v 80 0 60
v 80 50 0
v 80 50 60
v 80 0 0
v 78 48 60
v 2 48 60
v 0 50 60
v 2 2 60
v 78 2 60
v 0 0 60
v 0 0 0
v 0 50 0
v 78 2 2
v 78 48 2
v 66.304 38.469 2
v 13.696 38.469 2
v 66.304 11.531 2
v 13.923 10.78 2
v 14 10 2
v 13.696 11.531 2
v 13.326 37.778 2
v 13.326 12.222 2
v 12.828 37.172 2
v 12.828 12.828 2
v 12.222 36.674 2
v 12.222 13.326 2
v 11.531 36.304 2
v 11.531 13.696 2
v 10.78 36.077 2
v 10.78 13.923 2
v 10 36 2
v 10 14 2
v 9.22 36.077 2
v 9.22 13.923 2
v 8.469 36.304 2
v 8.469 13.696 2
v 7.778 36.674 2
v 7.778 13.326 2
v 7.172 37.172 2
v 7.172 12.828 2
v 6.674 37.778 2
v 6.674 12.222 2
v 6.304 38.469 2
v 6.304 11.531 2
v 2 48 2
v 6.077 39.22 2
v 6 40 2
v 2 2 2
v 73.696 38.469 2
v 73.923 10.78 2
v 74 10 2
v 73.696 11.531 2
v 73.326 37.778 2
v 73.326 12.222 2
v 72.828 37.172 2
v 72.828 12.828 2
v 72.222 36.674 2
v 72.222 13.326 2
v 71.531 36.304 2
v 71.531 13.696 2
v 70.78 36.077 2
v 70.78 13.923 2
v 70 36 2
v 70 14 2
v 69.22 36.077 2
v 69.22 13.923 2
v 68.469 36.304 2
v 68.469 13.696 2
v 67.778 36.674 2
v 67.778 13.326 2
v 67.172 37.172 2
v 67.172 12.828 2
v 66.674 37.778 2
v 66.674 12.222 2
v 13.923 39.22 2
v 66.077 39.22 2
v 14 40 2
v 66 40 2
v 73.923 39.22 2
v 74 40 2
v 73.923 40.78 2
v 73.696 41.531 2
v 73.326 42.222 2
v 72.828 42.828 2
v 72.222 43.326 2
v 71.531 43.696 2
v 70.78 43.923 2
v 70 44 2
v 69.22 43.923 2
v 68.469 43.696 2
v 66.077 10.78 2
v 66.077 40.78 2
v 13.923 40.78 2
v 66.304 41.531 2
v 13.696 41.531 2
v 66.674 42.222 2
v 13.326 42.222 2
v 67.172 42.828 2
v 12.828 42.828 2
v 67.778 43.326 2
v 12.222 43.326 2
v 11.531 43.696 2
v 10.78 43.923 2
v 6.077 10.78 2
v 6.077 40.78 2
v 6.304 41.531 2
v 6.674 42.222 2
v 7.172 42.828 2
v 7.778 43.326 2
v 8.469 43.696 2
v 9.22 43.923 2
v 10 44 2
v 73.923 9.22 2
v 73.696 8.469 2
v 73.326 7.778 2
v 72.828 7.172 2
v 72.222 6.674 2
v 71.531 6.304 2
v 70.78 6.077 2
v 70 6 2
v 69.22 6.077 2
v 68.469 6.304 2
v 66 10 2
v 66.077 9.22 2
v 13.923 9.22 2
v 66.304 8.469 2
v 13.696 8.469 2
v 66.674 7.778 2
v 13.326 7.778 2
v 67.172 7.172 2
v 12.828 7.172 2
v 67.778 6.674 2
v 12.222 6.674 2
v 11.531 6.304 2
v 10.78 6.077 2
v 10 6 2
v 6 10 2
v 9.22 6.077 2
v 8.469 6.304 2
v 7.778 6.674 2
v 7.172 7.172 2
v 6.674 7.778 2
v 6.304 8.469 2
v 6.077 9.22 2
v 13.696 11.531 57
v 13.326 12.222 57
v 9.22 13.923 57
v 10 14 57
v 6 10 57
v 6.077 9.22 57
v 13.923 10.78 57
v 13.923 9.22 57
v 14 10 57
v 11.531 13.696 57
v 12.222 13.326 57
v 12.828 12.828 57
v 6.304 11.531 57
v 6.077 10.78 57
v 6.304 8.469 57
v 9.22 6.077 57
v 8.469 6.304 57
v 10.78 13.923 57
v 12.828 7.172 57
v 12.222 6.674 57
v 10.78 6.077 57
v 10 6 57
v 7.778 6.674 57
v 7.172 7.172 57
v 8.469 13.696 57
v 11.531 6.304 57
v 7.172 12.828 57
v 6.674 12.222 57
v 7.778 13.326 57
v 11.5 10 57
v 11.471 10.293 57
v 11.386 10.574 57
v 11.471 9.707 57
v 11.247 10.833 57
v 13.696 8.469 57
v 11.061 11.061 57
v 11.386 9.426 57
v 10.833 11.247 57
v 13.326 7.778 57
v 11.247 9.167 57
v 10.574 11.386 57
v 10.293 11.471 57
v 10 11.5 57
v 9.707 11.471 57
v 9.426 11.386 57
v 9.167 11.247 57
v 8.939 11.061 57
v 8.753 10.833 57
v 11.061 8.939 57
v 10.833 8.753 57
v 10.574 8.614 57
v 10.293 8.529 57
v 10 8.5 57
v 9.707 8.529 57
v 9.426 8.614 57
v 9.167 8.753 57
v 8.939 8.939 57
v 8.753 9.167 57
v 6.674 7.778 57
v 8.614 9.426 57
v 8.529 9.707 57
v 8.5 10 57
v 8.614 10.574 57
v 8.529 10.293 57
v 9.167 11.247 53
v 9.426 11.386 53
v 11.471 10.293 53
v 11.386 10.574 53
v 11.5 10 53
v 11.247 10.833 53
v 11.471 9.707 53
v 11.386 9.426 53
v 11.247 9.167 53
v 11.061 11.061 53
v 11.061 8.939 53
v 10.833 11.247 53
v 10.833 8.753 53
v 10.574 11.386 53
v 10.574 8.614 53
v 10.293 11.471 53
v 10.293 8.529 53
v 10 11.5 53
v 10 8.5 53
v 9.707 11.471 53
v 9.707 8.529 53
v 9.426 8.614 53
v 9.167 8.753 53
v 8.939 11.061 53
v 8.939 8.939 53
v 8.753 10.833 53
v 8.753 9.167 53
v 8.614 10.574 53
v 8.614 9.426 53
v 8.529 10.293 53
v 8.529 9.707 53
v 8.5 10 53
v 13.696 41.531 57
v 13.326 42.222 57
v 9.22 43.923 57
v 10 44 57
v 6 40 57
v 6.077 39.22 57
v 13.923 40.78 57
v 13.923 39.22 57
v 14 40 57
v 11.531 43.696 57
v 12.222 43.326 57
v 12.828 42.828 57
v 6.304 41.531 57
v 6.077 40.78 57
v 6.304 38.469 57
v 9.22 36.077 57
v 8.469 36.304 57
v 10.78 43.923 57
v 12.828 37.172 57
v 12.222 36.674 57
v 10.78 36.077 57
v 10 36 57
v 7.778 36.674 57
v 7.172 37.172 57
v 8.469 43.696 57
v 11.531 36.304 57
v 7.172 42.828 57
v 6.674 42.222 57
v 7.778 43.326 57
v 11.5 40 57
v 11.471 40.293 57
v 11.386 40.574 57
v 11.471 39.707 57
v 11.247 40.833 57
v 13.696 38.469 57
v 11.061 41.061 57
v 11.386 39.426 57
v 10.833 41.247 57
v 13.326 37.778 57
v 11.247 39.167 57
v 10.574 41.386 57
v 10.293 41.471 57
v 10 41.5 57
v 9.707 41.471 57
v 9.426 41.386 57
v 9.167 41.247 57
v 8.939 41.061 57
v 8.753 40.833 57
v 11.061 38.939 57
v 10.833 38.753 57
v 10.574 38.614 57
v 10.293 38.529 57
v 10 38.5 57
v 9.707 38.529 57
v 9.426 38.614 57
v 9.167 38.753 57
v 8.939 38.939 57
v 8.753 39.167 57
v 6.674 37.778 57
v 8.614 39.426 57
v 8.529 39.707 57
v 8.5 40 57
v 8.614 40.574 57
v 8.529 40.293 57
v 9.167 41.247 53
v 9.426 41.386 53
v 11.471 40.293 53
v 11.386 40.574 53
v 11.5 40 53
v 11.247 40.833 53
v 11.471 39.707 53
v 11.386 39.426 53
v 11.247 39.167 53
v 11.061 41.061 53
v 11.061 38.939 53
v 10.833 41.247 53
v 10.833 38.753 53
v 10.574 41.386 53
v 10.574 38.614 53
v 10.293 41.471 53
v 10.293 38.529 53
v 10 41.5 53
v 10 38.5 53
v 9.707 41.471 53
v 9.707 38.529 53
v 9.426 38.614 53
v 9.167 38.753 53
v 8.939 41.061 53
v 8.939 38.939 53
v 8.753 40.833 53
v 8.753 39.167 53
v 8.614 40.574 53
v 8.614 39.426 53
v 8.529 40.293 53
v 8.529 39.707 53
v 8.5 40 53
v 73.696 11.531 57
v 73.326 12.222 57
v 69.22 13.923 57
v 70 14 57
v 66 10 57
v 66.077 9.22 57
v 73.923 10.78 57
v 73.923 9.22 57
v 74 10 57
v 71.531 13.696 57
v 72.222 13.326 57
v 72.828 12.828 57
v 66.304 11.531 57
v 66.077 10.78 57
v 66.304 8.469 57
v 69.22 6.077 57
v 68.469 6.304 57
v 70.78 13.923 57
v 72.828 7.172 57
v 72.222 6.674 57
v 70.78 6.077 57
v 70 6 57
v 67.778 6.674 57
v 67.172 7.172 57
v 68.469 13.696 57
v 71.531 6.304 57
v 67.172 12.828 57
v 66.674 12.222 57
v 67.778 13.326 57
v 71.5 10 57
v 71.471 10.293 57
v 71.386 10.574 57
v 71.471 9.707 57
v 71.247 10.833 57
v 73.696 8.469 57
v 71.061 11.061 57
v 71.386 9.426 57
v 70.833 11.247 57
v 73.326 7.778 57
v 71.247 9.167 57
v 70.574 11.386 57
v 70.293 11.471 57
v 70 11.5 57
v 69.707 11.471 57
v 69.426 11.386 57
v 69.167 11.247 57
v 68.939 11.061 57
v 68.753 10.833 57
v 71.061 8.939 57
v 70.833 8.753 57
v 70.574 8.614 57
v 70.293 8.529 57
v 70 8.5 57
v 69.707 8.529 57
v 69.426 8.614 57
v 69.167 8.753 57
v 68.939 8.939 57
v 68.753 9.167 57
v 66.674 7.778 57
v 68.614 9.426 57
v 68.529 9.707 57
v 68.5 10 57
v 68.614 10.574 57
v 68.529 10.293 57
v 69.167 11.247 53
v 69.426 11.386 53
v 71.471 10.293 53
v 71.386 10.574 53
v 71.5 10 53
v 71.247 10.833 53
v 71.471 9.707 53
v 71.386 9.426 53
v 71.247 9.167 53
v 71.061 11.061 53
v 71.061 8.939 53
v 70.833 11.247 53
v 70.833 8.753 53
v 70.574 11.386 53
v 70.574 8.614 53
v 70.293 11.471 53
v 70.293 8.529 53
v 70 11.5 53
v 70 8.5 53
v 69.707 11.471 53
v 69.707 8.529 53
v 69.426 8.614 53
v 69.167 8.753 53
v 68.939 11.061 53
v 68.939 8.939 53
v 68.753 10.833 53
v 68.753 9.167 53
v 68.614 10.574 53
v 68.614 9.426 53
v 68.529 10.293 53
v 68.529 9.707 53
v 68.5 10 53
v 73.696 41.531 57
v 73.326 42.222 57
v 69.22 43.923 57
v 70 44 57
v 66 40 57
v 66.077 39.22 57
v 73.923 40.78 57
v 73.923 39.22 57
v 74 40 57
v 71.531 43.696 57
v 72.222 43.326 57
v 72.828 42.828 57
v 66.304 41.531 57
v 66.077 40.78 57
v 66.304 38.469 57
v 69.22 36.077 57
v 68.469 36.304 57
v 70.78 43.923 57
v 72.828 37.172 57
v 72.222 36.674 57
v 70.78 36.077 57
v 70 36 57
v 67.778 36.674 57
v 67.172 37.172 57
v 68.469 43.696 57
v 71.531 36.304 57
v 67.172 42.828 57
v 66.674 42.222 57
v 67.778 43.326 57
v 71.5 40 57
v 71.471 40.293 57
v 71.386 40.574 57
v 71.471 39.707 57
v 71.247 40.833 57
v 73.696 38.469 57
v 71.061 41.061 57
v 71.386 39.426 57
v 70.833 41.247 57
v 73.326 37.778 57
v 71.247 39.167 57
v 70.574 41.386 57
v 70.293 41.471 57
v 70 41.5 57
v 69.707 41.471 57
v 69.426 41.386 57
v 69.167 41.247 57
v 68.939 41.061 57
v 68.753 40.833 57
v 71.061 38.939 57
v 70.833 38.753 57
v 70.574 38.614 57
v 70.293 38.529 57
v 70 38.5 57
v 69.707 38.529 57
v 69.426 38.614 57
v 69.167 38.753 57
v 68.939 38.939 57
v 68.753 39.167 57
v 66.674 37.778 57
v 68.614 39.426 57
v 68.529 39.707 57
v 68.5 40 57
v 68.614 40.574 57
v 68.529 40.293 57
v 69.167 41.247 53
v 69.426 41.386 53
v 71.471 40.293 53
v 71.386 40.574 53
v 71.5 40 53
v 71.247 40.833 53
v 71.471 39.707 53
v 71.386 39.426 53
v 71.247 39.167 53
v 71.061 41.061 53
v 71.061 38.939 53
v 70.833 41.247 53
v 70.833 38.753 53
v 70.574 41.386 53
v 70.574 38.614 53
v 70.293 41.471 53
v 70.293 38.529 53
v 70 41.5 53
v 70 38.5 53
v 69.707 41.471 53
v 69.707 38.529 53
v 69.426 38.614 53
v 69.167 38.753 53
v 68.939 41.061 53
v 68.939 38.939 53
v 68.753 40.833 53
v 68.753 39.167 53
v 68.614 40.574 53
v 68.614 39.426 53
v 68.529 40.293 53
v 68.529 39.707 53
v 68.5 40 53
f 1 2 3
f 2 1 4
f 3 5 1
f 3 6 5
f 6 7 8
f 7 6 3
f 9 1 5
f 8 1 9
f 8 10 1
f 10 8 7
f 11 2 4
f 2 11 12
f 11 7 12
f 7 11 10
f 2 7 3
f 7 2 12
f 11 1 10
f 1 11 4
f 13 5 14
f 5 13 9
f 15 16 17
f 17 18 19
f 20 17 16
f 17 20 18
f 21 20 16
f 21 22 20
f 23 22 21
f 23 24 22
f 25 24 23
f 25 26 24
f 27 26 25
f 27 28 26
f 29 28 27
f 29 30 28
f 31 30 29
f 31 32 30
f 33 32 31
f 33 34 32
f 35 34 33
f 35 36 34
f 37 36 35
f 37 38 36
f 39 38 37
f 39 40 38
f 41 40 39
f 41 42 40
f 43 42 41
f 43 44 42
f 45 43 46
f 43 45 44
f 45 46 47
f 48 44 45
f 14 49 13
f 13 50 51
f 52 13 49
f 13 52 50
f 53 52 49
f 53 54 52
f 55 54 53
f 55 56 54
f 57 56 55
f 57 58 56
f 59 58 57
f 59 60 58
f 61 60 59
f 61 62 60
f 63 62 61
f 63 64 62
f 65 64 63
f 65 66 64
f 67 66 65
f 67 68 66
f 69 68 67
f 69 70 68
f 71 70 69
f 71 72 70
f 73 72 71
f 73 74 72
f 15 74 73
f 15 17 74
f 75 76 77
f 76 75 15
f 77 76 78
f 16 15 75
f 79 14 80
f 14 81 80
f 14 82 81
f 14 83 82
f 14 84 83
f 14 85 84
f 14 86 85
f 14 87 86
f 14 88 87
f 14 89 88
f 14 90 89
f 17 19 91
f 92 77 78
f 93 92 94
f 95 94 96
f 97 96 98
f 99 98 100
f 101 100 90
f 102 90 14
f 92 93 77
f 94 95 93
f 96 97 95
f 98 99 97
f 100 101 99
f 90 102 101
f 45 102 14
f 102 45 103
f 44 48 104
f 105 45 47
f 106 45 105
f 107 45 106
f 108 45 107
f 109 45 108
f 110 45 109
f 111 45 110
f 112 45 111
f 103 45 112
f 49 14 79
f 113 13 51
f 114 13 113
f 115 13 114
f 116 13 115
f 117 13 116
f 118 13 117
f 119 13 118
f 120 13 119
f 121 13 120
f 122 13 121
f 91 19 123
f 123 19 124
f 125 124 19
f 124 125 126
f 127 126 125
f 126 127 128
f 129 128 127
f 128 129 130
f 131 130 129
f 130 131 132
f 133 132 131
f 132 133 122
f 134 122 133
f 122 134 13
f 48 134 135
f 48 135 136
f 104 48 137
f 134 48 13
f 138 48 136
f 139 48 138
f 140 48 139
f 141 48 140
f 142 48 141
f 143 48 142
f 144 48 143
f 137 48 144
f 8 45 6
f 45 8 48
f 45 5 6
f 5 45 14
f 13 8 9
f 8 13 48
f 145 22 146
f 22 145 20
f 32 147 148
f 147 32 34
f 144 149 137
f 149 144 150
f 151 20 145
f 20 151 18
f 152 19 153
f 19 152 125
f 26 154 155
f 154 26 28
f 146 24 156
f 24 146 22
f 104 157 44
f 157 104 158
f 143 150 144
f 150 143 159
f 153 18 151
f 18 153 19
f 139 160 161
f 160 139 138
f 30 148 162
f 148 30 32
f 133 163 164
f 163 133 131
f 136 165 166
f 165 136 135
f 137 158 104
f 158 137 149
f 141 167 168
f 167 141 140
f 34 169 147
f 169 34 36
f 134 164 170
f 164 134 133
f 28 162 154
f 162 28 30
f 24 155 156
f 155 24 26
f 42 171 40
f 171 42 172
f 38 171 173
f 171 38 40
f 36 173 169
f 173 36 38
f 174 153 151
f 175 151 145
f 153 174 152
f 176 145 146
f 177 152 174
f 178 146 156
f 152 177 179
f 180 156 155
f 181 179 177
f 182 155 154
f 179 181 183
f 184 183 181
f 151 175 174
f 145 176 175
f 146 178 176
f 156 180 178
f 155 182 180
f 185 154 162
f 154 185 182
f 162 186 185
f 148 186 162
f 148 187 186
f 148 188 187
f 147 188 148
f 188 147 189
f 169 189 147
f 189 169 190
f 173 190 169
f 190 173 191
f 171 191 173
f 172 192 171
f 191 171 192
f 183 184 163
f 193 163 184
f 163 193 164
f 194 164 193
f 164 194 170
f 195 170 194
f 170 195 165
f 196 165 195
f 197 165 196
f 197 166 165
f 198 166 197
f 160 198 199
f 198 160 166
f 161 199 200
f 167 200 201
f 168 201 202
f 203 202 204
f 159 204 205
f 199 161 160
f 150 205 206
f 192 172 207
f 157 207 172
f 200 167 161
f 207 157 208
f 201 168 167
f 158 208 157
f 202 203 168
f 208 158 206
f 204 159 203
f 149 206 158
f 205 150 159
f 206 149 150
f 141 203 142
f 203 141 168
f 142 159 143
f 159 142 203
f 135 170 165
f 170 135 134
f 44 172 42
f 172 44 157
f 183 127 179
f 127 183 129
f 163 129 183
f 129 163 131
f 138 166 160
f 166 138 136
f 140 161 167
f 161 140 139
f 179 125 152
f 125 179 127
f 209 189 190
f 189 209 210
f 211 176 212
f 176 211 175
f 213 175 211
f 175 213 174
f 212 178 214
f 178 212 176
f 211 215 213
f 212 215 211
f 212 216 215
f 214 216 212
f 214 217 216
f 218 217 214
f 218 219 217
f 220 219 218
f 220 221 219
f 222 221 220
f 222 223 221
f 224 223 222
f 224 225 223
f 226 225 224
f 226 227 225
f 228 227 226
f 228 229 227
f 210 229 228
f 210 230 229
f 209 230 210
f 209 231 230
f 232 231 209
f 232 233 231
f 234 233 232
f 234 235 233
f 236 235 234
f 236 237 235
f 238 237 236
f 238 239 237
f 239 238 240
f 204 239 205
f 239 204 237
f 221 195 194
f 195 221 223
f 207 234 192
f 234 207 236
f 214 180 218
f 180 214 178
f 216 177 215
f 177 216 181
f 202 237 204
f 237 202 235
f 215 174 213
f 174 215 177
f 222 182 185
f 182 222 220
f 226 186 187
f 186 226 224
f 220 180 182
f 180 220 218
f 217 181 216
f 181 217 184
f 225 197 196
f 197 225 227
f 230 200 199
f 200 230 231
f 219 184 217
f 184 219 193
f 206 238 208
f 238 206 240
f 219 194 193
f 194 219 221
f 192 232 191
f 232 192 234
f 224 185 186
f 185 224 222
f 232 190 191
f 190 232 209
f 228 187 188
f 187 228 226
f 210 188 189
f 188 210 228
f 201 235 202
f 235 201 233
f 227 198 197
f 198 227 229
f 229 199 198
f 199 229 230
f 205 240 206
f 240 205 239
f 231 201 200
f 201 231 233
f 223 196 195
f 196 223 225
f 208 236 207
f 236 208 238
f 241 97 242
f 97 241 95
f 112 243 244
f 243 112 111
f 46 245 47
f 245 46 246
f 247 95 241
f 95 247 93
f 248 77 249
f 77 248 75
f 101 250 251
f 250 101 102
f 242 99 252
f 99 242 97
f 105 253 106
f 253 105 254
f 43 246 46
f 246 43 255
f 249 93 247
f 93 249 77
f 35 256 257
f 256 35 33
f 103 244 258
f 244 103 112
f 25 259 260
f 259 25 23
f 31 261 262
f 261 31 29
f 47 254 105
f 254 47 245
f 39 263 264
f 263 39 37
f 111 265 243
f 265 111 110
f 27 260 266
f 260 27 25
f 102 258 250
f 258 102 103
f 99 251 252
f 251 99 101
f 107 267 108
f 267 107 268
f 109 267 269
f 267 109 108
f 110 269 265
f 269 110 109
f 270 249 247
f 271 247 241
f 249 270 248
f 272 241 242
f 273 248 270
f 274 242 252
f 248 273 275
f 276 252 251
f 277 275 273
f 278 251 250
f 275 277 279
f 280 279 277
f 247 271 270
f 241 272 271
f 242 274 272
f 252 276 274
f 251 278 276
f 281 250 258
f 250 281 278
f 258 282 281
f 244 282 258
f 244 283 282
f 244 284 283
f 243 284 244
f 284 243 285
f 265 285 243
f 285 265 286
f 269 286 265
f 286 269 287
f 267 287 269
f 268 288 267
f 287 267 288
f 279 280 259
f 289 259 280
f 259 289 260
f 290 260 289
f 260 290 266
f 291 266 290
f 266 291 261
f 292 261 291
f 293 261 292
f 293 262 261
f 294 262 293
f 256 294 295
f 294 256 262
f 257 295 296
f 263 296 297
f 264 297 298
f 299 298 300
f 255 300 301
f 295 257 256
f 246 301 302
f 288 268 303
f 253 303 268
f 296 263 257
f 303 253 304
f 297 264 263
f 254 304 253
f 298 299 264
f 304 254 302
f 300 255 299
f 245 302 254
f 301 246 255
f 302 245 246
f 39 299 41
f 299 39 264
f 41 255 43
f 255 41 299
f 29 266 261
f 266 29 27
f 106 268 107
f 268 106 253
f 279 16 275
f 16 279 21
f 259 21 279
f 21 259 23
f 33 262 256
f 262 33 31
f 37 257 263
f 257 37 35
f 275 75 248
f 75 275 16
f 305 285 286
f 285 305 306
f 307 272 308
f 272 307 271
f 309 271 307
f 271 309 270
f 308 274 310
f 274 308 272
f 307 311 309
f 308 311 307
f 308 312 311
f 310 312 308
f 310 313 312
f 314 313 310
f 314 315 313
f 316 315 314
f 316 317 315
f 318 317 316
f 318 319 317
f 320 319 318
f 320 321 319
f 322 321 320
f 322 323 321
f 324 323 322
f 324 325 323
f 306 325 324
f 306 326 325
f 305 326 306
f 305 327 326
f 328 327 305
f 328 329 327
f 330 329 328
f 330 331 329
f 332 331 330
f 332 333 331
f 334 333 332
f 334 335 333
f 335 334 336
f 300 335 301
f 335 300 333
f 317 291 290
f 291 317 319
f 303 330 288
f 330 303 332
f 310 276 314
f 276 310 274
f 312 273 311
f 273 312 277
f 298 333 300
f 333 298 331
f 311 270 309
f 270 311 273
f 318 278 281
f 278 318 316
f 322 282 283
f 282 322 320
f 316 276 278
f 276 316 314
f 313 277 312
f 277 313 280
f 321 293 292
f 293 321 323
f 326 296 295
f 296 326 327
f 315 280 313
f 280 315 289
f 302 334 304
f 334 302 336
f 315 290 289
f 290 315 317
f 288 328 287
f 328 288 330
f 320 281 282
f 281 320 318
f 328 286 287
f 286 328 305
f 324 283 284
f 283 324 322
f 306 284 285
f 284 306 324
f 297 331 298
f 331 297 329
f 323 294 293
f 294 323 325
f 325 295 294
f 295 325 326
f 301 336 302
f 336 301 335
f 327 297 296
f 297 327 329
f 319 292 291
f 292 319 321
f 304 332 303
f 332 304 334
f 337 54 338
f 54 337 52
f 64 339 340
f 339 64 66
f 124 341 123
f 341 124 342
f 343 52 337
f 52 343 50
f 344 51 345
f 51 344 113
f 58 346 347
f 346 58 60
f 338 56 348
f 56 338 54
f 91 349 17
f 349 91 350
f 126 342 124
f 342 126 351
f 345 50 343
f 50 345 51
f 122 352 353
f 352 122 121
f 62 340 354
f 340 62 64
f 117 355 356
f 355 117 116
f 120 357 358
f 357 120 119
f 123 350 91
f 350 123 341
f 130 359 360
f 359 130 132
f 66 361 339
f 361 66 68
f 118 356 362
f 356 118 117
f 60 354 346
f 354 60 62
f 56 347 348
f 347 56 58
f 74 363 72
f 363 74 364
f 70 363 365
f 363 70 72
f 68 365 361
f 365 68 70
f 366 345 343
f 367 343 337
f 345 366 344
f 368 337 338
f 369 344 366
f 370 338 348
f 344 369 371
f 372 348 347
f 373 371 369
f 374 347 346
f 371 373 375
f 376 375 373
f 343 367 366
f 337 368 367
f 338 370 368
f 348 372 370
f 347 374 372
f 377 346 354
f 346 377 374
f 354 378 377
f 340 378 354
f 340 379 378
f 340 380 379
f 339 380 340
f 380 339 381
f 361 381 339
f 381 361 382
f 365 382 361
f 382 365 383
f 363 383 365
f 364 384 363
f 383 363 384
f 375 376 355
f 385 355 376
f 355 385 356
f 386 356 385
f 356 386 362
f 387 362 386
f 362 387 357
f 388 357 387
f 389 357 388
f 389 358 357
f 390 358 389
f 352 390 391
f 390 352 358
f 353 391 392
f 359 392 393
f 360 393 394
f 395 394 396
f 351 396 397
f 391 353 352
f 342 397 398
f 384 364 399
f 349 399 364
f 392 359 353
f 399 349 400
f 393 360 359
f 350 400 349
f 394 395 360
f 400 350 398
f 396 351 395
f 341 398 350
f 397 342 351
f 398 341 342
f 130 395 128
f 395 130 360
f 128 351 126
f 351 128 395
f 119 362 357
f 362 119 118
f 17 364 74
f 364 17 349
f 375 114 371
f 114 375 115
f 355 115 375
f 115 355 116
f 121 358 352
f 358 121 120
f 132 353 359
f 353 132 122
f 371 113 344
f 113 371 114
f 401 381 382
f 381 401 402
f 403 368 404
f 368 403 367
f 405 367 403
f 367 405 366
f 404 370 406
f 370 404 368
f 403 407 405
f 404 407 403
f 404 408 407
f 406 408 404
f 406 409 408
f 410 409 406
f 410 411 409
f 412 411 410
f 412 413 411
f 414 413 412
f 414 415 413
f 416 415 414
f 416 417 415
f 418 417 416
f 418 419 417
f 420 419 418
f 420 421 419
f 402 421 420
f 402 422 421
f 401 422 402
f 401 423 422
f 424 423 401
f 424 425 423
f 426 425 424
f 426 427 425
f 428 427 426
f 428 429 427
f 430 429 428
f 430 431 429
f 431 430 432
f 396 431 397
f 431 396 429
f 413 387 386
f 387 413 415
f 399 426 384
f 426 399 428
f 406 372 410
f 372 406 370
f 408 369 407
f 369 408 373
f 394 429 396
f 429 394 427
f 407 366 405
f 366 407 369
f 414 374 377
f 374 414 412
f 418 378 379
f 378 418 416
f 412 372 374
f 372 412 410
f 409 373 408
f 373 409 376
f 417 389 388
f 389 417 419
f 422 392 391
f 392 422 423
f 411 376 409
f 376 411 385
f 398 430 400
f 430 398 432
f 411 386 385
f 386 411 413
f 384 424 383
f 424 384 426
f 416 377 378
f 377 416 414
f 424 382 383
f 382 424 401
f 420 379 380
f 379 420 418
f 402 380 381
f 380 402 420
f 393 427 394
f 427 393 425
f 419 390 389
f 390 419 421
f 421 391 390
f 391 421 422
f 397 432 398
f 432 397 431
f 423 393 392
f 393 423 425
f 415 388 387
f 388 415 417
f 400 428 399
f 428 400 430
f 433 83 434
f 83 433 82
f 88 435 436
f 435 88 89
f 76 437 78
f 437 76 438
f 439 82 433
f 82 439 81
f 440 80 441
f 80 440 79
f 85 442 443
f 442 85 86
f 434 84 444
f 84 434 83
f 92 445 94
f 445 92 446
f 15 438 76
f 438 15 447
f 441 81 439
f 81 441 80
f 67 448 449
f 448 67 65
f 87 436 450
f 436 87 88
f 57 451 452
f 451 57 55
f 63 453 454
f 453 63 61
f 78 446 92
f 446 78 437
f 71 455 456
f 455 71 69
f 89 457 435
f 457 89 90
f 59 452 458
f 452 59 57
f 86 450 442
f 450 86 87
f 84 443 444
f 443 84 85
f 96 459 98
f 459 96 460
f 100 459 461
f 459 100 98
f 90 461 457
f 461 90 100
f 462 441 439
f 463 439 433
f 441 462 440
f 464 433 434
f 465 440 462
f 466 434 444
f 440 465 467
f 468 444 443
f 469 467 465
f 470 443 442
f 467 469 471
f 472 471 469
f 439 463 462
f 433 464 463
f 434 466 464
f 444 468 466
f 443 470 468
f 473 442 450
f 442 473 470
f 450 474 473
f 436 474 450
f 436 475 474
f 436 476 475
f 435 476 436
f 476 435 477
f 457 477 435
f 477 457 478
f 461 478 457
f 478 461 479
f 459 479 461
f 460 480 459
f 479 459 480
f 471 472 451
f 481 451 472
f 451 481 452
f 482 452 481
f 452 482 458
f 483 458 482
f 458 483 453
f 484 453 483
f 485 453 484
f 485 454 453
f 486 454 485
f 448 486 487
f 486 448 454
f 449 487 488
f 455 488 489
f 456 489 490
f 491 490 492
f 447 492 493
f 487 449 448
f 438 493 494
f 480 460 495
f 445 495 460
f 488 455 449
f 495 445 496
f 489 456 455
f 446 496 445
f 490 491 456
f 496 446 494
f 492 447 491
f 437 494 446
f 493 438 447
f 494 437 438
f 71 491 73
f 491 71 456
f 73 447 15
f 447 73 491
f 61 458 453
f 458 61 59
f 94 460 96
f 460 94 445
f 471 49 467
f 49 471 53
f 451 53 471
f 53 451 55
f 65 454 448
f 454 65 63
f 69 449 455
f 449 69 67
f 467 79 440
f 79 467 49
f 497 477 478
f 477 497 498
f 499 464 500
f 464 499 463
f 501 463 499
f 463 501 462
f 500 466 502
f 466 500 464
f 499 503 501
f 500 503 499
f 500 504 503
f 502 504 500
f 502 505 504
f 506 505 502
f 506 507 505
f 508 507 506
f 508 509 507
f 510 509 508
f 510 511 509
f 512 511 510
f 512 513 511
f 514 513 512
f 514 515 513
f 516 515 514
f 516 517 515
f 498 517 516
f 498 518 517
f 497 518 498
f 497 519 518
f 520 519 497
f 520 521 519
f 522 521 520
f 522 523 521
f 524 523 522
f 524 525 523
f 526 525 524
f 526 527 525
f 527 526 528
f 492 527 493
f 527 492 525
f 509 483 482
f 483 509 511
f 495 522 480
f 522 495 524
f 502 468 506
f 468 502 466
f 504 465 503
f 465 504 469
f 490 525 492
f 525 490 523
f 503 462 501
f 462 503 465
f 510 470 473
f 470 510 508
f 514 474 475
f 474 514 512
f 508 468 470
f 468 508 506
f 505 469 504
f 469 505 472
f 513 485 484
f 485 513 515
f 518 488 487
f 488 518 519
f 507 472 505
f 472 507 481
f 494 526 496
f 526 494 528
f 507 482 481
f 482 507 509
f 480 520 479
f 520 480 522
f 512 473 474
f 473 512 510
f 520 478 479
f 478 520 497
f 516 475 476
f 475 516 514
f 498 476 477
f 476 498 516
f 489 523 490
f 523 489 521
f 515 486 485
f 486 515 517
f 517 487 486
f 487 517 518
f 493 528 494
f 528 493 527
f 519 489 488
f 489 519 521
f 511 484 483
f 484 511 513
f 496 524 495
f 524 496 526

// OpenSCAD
$fn = 32;

// ----------------------------------------------------------------------
// Enclosure box: bosses enclosure
// ----------------------------------------------------------------------

// --- parameters (mm) ---
box_l = 80;               // outer length, X
box_w = 50;               // outer width, Y
box_h = 60;               // outer height
wall_t = 2;               // wall thickness
boss_r = 4;               // corner boss radius
hole_r = 1.5;             // boss screw hole radius
boss_in = 10;             // boss inset from the corners
fit_tol = 0.1;            // tolerance for press fits, mm
free_tol = 0.5;           // tolerance for clearance fits, mm

inner_h = box_h - wall_t;  // cavity depth
boss_h = inner_h - 2;  // corner boss height

difference() {
  union() {
    difference() {
      cube([box_l, box_w, box_h]);
      translate([wall_t, wall_t, wall_t])
        cube([box_l - 2 * wall_t, box_w - 2 * wall_t, box_h]);
    }
    for (sx = [0, 1], sy = [0, 1])
      translate([sx ? box_l - boss_in : boss_in,
                 sy ? box_w - boss_in : boss_in, wall_t - 1])
        difference() {
          cylinder(r = boss_r, h = boss_h);
          translate([0, 0, boss_h - 4])
            cylinder(r = hole_r, h = 5);
        }
  }
}
